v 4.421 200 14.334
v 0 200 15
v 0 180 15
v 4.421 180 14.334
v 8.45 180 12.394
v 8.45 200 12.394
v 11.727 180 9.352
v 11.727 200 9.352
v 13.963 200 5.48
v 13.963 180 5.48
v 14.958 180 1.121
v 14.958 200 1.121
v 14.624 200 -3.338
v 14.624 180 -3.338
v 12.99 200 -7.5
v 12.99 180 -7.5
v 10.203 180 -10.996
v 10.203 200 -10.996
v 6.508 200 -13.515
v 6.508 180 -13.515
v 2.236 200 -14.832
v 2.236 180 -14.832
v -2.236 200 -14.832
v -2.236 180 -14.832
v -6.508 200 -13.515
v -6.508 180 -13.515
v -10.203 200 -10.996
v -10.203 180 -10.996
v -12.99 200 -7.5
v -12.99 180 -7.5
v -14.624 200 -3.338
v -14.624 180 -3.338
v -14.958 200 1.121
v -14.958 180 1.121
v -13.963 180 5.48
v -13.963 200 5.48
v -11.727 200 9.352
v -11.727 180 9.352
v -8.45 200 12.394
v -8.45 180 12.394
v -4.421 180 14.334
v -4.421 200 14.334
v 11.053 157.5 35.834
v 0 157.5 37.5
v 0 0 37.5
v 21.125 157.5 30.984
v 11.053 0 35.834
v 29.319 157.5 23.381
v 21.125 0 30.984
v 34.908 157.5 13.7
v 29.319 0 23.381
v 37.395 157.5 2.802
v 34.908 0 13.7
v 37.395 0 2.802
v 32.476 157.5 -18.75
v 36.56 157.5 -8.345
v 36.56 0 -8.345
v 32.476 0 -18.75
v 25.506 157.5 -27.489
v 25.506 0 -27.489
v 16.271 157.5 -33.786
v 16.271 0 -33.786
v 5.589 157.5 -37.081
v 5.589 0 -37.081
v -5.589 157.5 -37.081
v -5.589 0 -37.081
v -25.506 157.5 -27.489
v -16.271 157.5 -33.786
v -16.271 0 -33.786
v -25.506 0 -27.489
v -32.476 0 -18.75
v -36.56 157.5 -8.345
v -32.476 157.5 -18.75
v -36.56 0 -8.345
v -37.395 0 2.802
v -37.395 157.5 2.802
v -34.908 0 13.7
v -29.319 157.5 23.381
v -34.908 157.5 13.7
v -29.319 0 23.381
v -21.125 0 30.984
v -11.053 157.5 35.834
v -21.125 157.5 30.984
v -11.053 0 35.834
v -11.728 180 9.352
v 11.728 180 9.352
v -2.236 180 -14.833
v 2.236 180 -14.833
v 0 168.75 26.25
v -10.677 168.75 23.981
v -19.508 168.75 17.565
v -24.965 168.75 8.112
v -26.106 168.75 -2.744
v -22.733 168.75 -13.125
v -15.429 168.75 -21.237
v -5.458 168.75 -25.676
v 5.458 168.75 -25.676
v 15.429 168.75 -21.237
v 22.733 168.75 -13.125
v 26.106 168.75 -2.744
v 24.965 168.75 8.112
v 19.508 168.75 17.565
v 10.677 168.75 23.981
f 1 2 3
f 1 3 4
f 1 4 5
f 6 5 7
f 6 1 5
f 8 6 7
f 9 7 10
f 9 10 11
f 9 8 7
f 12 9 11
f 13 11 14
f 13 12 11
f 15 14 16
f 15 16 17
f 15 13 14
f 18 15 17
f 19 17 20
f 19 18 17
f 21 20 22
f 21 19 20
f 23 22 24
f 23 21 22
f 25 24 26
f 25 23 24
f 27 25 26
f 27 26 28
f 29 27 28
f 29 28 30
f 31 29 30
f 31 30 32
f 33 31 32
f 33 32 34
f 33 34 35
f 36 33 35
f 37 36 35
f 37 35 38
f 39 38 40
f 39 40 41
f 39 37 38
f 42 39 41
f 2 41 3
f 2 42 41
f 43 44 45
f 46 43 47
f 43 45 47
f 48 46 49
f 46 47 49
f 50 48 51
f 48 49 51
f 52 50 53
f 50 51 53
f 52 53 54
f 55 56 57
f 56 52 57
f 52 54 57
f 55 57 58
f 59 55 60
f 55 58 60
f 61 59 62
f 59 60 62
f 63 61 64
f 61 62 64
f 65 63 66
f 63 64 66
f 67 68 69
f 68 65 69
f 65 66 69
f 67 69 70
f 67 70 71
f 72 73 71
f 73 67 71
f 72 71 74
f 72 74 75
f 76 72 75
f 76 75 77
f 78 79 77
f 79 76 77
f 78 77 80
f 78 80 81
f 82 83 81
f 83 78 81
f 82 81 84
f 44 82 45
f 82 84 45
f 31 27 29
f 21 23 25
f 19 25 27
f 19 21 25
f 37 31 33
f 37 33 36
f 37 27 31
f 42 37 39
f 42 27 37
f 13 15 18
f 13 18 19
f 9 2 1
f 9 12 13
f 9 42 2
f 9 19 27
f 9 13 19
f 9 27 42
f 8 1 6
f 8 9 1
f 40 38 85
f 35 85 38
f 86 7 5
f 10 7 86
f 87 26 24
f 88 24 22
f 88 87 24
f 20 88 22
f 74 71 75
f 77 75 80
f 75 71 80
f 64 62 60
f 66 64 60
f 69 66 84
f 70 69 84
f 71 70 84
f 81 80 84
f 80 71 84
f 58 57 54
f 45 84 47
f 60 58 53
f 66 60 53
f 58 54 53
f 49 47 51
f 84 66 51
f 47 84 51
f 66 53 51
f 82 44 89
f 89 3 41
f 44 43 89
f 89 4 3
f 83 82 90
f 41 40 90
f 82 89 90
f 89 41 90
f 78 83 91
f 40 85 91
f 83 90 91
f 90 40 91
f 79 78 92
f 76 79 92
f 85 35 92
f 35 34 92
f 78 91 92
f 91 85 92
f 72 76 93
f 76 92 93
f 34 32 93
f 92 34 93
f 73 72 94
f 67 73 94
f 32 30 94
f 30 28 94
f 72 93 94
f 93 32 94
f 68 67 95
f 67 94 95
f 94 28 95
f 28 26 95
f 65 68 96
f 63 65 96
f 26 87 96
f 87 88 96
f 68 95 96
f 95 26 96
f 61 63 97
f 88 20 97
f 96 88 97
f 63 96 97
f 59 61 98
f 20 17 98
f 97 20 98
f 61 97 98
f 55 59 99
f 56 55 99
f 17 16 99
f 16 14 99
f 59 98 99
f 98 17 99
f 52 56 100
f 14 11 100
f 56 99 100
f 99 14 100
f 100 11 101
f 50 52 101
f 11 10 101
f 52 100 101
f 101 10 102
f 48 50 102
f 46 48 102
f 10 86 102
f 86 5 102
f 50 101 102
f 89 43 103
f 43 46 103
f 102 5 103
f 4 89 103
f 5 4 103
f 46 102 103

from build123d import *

# Parameters (mm, degrees)
ESQUISSE1_R         = 37.5
EXTRUSION1_DEPTH    = 200
ESQUISSE2_OUTSIDE_W = 122.276
ESQUISSE2_OUTSIDE_H = 122.276
ESQUISSE2_OUTSIDE_R = 15
EXTRUSION2_DEPTH    = 20
CHANFREIN1_SIZE     = 22.5


with BuildPart() as part:
    # Esquisse1 → Extrusion1 (new body)
    with BuildSketch(Plane(origin=(0, 0, 0), x_dir=(1, 0, 0), z_dir=(0, 1, 0))):
        with Locations(Location((0, 0, 0), (0, 0, 270))):
            Circle(ESQUISSE1_R)
    extrude(amount=EXTRUSION1_DEPTH)

    # Esquisse2 outside → Extrusion2 (cut)
    with BuildSketch(Plane(origin=(0, 200, 0), x_dir=(1, 0, 0), z_dir=(0, 1, 0))):
        Rectangle(ESQUISSE2_OUTSIDE_W, ESQUISSE2_OUTSIDE_H)
        with Locations(Location((0, 0, 0), (0, 0, 270))):
            Circle(ESQUISSE2_OUTSIDE_R, mode=Mode.SUBTRACT)
    extrude(amount=-EXTRUSION2_DEPTH, mode=Mode.SUBTRACT)

    # Chanfrein1
    chanfrein1_edges = [part.edges().sort_by_distance(p)[0] for p in [
        (0, 180, -37.5),
    ]]
    chamfer(chanfrein1_edges, length=CHANFREIN1_SIZE - 0.0001)  # a hair under: the kernel refuses the full size


solid = part.part
